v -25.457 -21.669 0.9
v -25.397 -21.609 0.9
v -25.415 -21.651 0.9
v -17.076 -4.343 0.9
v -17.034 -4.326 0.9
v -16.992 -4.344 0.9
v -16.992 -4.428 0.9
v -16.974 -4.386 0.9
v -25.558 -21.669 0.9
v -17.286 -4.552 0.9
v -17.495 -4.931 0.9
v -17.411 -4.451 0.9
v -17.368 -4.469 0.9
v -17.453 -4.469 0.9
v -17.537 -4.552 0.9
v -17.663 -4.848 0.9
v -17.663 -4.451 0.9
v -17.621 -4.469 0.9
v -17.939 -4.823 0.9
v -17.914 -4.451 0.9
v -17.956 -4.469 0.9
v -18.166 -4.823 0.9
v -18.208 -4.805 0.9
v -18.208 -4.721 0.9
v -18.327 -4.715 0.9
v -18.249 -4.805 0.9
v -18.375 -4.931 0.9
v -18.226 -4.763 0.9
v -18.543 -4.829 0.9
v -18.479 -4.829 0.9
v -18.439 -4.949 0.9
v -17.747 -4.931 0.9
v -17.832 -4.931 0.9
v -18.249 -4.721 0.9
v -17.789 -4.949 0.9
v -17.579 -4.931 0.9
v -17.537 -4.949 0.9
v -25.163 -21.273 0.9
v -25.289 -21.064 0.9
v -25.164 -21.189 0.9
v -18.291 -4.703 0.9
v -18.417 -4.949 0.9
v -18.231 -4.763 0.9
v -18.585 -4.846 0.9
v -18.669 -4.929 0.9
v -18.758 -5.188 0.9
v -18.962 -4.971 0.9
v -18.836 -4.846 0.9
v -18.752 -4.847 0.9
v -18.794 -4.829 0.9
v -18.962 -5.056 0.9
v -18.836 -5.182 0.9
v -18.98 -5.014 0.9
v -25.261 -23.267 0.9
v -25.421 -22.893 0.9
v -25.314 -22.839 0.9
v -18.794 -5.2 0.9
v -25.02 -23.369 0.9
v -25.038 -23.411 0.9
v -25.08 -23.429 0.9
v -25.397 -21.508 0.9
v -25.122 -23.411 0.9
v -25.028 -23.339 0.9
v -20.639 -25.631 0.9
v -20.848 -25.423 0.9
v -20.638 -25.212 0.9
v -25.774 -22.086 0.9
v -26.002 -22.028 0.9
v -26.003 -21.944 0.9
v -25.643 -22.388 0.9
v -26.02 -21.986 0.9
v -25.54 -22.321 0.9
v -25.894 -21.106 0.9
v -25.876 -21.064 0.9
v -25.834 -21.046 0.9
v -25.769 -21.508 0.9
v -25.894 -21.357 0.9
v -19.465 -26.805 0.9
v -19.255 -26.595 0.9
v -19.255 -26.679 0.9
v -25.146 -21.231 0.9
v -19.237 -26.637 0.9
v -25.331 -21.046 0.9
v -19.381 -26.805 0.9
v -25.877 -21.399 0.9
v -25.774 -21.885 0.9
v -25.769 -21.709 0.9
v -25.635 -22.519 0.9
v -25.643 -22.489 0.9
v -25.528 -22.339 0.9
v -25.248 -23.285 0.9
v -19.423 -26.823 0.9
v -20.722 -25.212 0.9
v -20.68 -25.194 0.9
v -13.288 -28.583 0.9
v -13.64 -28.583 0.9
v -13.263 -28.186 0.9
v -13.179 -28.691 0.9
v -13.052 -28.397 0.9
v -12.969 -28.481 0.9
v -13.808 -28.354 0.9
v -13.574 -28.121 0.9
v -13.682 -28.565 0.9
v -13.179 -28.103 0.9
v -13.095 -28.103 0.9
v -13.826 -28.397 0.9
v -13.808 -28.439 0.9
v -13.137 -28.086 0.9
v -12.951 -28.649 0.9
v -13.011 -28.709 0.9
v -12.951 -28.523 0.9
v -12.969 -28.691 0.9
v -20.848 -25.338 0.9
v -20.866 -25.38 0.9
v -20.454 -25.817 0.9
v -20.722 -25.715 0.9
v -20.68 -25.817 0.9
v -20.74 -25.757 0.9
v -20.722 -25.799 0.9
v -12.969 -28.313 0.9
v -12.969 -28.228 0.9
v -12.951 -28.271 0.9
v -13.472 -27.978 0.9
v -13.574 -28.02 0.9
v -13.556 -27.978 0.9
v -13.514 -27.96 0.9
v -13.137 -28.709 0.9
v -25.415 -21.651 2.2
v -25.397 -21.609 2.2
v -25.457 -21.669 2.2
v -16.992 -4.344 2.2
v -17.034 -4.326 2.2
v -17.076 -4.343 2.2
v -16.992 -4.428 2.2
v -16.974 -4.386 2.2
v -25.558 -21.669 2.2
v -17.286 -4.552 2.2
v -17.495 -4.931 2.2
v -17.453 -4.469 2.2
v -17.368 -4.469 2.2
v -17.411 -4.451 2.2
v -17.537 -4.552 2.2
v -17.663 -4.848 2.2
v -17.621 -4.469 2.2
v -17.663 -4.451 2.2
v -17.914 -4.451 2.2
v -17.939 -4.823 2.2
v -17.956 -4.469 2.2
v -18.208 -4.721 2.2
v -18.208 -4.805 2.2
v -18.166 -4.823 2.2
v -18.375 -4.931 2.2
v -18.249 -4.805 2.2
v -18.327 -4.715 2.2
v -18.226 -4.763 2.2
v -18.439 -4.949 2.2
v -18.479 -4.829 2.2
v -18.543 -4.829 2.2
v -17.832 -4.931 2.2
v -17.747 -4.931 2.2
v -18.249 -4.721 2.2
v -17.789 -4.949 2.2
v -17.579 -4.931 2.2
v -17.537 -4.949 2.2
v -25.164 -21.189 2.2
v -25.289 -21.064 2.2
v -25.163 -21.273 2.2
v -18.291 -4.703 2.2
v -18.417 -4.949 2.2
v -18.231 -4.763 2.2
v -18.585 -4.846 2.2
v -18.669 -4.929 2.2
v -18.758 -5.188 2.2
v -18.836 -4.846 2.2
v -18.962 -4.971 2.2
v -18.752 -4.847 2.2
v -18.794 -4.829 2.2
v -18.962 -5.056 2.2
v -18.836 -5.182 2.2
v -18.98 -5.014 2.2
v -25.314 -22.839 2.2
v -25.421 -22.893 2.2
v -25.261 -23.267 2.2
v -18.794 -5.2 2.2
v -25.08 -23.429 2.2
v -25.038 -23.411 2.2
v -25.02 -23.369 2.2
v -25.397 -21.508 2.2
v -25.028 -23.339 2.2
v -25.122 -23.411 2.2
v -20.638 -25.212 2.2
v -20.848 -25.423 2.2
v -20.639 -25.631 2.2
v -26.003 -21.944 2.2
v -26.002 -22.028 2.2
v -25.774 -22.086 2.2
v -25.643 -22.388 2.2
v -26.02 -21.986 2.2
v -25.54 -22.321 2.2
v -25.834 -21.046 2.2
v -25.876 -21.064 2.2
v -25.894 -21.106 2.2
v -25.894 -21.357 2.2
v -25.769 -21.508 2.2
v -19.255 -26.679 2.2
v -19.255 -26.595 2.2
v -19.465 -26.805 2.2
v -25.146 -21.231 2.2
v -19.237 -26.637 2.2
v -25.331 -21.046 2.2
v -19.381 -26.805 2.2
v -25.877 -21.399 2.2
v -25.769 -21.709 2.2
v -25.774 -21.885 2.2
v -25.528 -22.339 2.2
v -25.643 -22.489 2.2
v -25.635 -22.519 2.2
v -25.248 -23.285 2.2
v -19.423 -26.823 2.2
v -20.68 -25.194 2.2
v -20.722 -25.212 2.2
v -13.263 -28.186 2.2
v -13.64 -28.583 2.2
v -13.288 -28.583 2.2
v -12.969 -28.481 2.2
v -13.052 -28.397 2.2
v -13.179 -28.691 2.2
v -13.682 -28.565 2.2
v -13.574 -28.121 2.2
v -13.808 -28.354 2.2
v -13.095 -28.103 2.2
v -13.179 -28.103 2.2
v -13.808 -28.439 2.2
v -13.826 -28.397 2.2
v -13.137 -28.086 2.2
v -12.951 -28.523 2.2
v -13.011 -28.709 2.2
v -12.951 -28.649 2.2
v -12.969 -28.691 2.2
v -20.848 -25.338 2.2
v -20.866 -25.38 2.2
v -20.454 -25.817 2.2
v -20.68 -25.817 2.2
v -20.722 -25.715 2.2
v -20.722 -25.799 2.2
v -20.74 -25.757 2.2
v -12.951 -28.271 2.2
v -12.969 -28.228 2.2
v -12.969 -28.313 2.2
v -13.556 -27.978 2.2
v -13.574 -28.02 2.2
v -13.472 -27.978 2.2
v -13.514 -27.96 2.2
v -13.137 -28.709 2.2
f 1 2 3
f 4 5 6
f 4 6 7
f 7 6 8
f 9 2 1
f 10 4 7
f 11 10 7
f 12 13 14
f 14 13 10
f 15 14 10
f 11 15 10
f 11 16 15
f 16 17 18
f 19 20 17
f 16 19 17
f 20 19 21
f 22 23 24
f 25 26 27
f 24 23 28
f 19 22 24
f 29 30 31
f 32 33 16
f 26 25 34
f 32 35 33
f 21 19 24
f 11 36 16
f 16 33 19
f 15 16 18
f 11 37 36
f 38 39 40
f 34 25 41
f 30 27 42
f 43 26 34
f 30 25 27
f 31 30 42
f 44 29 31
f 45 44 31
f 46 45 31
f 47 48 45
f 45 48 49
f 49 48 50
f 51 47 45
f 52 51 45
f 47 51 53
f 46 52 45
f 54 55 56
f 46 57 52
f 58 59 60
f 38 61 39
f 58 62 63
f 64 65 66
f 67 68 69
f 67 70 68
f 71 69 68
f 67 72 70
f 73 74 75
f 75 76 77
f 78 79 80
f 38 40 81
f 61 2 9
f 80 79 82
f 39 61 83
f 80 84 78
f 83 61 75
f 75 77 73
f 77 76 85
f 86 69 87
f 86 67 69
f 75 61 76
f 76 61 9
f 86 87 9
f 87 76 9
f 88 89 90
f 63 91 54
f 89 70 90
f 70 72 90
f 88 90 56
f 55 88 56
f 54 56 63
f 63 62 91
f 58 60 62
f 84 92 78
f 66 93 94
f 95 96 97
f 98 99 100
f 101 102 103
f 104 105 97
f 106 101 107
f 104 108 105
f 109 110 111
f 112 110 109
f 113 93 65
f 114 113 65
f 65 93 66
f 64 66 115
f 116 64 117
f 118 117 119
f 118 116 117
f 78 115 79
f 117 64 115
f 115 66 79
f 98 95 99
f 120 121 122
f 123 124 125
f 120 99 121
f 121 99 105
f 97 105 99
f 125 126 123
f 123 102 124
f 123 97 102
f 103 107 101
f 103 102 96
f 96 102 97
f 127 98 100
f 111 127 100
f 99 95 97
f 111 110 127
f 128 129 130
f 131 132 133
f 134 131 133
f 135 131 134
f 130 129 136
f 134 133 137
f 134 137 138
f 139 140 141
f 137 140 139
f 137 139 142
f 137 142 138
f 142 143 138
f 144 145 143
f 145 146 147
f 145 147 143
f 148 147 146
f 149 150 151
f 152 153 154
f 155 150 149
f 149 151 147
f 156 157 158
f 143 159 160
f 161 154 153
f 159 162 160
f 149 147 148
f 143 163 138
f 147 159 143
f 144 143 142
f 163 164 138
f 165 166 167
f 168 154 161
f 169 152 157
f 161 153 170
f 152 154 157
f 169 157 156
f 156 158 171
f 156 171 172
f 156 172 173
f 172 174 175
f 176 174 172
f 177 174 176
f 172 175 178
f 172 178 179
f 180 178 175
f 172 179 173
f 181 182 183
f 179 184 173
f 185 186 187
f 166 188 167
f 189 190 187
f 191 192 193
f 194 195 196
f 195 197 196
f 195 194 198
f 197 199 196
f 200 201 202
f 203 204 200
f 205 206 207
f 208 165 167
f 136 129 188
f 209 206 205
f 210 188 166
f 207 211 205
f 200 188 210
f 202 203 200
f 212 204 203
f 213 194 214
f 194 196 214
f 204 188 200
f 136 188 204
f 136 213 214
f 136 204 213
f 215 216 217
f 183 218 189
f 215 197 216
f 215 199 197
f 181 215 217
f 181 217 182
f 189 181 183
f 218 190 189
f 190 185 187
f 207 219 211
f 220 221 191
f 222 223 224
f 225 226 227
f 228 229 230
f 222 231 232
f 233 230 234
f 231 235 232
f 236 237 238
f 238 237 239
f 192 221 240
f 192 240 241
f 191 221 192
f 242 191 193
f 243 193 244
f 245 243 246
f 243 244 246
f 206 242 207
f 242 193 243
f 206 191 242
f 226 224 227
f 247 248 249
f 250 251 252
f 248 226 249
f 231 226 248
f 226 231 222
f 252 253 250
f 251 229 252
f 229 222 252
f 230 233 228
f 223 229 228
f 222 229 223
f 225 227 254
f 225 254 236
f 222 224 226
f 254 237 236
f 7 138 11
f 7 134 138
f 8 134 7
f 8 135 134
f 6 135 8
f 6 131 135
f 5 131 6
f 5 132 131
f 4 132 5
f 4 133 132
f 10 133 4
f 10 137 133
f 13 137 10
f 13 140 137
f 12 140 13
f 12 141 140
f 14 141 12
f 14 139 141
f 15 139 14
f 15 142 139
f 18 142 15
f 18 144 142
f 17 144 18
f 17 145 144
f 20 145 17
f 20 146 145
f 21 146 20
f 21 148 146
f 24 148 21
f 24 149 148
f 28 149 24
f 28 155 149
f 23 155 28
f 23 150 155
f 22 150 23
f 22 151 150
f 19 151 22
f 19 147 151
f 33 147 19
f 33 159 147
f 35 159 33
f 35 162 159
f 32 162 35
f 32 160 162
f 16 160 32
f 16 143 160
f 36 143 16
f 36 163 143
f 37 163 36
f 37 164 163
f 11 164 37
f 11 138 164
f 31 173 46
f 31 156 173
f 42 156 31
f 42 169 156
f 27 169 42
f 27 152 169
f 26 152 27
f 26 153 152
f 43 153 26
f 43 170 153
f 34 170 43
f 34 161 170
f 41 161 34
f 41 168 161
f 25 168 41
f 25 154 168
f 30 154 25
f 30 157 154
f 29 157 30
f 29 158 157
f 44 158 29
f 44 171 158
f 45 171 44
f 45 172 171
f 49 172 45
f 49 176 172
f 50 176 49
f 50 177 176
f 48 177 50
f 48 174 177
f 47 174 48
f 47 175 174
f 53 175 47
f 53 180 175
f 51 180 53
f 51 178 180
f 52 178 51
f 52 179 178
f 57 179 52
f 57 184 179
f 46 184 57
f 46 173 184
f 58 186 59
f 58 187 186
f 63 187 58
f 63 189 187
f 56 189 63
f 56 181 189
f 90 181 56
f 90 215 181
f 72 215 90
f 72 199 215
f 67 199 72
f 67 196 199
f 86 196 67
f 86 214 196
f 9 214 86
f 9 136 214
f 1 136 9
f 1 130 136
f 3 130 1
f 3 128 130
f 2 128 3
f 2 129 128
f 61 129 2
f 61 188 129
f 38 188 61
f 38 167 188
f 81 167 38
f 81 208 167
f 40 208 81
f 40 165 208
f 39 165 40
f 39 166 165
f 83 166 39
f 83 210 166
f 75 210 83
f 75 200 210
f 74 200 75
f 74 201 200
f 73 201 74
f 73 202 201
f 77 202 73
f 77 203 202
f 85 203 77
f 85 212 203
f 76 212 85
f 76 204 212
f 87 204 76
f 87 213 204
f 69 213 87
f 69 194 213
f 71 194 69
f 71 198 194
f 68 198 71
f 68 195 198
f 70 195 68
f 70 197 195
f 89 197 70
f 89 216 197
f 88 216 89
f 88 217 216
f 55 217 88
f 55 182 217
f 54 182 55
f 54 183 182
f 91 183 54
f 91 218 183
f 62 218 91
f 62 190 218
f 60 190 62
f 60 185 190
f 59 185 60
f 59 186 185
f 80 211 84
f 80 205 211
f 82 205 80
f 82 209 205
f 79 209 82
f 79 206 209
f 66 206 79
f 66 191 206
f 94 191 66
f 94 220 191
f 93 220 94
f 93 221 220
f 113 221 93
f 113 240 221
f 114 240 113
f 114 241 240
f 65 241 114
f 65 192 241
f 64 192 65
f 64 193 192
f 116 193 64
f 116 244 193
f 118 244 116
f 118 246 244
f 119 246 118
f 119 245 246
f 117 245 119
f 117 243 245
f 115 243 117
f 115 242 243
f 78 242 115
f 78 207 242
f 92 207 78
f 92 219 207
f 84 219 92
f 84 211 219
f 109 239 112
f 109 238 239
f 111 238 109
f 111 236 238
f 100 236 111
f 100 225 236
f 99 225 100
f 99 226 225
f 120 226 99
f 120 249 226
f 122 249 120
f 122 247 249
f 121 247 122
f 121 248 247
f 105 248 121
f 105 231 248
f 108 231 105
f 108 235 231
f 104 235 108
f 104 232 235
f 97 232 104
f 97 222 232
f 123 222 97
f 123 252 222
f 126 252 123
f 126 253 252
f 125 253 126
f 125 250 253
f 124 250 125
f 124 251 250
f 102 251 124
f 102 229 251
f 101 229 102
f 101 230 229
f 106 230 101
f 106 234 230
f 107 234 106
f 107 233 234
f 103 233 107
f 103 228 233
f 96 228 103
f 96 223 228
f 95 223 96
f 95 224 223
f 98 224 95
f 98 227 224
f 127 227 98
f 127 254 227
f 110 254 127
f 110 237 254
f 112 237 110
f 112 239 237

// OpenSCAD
$fn = 24;
translate([0, -2.500, 0.900])
  linear_extrude(height=1.300) {
offset(r=0.06, $fn=8) {
    polygon(points=[[-13.011,-25.771],[-13.137,-25.646],[-13.263,-25.771],[-13.514,-25.520],[-13.514,-25.646],[-13.766,-25.897],[-14.017,-25.897],[-14.143,-26.023],[-14.017,-25.897],[-13.766,-25.897],[-13.640,-26.023],[-13.766,-26.149],[-13.640,-26.023],[-13.263,-26.023],[-13.137,-26.149],[-13.011,-26.149],[-13.011,-26.023],[-13.137,-25.897]], paths=[[0,1,2,3,4,5,6,7,8,9,10,11,12,13,14,15,16,17]]);
    polygon(points=[[-20.680,-22.754],[-20.806,-22.880],[-20.554,-23.131],[-20.680,-23.257],[-20.429,-23.257],[-19.297,-24.389],[-19.423,-24.263],[-19.297,-24.137]], paths=[[0,1,2,3,4,5,6,7]]);
    polygon(points=[[-25.960,-18.103],[-25.960,-18.480],[-26.086,-18.606],[-26.086,-18.731],[-26.086,-18.606],[-25.960,-18.480],[-25.834,-18.606],[-25.834,-18.857],[-25.960,-18.983],[-25.960,-19.109],[-25.960,-18.983],[-25.834,-18.857],[-25.709,-18.983],[-25.709,-19.234],[-25.960,-19.486],[-25.583,-19.863],[-25.583,-19.989],[-25.080,-20.869],[-25.206,-20.743],[-25.583,-19.863],[-25.834,-19.611],[-25.834,-19.360],[-25.583,-19.109],[-25.457,-19.109],[-25.457,-18.983],[-25.206,-18.731],[-25.331,-18.606],[-25.834,-18.606],[-25.960,-18.480]], paths=[[0,1,2,3,4,5,6,7,8,9,10,11,12,13,14,15,16,17,18,19,20,21,22,23,24,25,26,27,28]]);
    polygon(points=[[-17.034,-1.886],[-17.160,-1.760],[-17.034,-1.886],[-17.286,-2.137],[-17.411,-2.011],[-17.537,-2.137],[-17.663,-2.011],[-17.914,-2.011],[-18.040,-2.137],[-18.166,-2.011],[-18.040,-2.137],[-18.166,-2.263],[-18.291,-2.263],[-18.417,-2.137],[-18.291,-2.263],[-18.417,-2.389],[-18.543,-2.389],[-18.669,-2.514],[-18.794,-2.389],[-18.920,-2.514],[-18.794,-2.640],[-18.291,-2.263],[-17.914,-2.263],[-17.789,-2.389],[-17.663,-2.263],[-17.537,-2.389]], paths=[[0,1,2,3,4,5,6,7,8,9,10,11,12,13,14,15,16,17,18,19,20,21,22,23,24,25]]);
}
}
